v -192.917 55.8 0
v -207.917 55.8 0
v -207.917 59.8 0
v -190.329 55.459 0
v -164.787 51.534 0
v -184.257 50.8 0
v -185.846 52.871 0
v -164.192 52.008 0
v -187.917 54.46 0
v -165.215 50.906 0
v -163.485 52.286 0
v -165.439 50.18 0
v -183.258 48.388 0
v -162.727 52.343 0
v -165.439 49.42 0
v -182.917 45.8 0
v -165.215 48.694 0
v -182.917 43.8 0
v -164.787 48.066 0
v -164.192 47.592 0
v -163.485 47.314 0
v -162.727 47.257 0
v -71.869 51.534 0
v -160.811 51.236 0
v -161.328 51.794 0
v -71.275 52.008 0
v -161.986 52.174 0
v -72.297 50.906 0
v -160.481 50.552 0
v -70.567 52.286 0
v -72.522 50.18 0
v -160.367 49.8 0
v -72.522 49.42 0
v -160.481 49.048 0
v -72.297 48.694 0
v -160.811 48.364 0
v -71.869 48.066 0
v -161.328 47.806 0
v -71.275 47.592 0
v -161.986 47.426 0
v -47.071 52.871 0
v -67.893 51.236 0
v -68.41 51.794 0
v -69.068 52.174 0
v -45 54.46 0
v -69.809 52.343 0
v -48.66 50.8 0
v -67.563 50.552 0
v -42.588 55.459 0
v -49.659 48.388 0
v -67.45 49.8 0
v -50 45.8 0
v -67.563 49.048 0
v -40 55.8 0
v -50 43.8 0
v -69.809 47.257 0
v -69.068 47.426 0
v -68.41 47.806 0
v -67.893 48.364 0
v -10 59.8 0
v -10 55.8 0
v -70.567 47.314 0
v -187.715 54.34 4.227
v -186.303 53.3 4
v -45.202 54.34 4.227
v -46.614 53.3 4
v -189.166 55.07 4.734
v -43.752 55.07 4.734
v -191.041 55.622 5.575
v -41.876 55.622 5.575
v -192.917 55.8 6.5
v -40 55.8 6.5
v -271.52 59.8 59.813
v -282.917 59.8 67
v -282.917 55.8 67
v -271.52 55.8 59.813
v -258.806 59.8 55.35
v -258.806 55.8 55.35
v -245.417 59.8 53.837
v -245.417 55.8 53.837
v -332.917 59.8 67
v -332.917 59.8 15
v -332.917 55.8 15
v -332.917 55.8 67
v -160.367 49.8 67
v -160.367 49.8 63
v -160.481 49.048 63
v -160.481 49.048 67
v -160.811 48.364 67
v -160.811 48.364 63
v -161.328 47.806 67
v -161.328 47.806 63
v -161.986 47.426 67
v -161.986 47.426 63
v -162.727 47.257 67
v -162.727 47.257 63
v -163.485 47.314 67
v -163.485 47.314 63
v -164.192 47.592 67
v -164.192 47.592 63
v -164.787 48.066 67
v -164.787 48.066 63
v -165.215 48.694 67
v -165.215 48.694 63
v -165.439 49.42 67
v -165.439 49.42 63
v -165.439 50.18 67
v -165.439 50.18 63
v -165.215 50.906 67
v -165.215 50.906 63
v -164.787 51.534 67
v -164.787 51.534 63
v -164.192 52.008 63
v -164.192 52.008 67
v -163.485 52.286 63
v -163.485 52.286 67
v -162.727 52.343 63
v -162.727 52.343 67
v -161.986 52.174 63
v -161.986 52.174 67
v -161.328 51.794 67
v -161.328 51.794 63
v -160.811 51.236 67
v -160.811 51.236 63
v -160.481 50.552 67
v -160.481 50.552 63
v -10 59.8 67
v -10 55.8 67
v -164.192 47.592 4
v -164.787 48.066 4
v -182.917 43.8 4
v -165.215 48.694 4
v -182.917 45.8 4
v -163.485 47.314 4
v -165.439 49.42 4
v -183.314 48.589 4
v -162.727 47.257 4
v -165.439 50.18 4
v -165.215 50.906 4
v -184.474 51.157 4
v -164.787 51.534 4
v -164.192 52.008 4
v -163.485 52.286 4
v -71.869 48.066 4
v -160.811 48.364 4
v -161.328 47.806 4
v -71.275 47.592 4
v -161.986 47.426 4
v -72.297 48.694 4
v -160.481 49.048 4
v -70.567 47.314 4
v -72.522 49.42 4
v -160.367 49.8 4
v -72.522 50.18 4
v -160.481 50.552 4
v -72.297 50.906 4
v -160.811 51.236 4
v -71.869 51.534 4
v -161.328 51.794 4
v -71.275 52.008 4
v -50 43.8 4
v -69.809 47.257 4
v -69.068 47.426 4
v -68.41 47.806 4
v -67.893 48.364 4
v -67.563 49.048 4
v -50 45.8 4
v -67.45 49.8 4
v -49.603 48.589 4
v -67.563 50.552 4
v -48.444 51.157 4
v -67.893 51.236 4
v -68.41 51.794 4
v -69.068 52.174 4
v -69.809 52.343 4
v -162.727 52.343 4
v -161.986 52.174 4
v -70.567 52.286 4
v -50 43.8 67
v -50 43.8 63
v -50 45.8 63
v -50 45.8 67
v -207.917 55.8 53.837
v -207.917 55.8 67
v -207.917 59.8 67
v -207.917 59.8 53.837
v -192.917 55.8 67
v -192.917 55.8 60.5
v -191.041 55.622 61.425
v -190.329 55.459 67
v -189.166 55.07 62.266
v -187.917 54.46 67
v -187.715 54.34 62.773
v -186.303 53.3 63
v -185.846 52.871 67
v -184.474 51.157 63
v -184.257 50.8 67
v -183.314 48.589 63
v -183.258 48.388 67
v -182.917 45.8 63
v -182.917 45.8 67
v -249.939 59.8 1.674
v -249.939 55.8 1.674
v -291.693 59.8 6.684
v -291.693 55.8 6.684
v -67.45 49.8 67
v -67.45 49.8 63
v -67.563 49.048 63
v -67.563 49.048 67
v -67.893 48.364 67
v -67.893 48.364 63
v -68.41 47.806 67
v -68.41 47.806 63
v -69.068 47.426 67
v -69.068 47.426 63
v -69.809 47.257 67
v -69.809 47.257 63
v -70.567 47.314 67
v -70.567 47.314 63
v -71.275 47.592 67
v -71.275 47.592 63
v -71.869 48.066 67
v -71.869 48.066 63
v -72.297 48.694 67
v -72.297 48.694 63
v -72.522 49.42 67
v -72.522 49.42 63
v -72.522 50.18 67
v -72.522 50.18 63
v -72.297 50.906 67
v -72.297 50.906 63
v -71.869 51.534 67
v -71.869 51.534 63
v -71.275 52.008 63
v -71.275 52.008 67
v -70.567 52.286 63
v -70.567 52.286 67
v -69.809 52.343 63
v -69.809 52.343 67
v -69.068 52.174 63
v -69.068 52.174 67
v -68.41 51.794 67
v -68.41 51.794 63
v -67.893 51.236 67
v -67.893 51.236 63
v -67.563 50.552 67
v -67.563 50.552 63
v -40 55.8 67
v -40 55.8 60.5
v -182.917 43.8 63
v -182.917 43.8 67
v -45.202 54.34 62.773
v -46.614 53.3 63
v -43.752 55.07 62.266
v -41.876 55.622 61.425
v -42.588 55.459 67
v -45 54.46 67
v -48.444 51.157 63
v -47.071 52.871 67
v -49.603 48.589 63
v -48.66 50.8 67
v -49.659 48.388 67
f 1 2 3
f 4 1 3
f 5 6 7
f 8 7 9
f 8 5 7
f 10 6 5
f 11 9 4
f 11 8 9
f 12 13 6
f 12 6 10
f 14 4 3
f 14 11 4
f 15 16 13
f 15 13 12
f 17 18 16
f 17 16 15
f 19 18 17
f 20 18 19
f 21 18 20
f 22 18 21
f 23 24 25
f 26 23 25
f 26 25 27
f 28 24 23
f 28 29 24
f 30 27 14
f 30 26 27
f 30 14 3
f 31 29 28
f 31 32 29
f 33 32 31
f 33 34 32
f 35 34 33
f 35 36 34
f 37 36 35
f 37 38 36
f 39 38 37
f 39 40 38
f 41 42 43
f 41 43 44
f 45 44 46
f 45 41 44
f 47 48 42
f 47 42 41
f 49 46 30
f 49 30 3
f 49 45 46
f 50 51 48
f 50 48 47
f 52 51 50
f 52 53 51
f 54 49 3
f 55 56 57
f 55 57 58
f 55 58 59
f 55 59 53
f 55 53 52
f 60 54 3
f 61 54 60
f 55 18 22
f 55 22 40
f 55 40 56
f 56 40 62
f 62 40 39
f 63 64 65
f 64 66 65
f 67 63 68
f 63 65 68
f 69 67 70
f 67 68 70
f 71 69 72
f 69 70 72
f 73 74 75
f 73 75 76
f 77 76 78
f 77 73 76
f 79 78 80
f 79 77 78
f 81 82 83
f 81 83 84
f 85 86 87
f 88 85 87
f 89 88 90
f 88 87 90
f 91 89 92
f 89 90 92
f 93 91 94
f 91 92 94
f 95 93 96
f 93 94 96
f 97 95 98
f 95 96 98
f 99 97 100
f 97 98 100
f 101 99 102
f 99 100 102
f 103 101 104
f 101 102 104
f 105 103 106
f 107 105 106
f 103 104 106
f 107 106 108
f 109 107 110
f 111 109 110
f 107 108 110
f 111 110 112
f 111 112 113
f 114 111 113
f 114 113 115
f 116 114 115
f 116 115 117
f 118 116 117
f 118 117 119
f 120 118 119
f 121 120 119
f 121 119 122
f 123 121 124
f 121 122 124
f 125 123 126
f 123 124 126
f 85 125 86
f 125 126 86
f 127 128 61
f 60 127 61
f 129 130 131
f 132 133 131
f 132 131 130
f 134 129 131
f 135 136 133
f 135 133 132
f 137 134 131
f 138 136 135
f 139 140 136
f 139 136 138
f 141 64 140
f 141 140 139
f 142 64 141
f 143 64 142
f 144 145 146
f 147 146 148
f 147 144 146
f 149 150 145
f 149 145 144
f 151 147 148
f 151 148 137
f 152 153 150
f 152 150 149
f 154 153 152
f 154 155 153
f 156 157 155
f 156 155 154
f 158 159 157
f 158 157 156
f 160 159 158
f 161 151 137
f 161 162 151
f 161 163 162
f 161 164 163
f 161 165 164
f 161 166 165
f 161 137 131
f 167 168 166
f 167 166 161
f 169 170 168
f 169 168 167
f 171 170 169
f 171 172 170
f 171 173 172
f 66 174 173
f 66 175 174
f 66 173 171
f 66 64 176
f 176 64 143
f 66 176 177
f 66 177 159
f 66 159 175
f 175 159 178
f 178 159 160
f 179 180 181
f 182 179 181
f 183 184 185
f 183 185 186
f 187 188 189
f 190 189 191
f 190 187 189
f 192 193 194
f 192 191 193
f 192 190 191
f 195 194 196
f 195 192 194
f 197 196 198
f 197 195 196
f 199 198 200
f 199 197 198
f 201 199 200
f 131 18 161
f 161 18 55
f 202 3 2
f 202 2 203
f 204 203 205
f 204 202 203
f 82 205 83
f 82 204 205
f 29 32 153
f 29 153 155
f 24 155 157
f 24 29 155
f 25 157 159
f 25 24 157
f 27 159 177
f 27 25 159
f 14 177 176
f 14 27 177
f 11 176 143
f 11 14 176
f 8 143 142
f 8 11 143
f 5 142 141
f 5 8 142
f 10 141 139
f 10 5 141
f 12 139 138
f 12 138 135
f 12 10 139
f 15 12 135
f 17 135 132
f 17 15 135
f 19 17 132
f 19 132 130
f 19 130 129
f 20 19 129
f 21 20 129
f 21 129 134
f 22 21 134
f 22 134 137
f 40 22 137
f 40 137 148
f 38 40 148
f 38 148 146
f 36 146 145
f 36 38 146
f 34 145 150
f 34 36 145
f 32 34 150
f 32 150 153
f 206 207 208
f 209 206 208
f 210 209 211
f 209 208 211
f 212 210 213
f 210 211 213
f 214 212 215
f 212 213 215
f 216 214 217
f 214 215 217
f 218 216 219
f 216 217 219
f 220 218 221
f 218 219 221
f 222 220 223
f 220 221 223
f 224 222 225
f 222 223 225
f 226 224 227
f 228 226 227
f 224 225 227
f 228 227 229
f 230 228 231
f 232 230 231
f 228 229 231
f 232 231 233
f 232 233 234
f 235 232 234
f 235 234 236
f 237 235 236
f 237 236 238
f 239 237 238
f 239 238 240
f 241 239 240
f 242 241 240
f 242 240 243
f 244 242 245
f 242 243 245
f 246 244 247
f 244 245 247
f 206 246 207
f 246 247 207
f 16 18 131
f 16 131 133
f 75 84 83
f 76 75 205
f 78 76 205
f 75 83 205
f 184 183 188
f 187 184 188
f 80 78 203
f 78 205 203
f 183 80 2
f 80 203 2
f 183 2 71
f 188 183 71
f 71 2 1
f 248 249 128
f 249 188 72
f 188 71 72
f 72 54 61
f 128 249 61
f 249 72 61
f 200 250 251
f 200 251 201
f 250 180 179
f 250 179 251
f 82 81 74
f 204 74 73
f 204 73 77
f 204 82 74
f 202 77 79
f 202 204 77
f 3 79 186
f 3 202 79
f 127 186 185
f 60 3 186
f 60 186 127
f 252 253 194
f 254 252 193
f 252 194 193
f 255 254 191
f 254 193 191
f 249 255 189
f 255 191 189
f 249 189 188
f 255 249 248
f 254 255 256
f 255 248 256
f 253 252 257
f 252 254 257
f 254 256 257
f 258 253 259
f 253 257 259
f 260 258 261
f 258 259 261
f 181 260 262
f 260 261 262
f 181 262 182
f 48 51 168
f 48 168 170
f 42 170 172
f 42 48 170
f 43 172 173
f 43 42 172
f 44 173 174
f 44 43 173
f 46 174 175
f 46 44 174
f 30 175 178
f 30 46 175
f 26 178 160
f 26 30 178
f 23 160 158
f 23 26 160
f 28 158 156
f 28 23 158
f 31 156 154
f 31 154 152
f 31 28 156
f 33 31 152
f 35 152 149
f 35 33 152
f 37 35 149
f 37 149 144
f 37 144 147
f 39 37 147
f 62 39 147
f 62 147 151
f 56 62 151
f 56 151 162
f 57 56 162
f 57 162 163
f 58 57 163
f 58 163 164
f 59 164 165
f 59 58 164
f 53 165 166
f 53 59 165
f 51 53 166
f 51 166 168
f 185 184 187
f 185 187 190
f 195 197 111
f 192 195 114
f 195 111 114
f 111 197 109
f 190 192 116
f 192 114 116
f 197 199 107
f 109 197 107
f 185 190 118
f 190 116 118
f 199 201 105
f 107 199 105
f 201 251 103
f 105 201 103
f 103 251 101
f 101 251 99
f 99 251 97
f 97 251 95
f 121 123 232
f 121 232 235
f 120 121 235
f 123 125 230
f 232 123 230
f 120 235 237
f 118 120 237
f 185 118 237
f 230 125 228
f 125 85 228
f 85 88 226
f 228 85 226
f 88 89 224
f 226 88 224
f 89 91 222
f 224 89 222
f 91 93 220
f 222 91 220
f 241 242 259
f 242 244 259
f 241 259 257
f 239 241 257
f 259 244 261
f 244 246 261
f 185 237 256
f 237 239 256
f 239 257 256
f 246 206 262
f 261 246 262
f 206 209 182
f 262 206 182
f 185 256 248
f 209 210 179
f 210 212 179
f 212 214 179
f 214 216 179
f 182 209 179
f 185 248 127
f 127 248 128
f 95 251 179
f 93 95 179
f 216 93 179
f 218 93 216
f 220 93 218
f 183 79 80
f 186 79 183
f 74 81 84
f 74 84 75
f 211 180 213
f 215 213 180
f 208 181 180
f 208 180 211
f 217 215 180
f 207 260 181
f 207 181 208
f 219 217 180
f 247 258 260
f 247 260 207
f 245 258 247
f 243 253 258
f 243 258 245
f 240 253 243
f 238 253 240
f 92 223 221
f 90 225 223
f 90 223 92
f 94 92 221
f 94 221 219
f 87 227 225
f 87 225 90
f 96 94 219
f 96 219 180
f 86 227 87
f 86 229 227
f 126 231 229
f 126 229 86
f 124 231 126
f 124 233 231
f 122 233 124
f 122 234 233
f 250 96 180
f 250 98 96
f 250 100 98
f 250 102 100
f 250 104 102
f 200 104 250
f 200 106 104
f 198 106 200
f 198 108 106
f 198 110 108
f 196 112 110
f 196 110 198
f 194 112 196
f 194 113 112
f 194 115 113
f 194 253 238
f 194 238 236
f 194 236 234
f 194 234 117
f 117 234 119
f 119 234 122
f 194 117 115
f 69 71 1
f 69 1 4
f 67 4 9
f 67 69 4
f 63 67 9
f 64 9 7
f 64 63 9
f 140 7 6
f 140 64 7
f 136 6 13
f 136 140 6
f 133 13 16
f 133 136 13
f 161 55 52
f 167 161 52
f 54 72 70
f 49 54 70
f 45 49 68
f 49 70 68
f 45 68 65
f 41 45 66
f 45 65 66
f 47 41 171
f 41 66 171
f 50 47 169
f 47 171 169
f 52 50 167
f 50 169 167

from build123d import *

# Parameters (mm, degrees)
SKETCH1_W           = 132.917449813
SKETCH1_H           = 12
SKETCH1_R           = 2.55
BOSS_EXTRUDE1_DEPTH = 4
SKETCH2_W           = 197.917449813
SKETCH2_H           = 67
BOSS_EXTRUDE2_DEPTH = 4
BOSS_EXTRUDE3_START = 4
SKETCH3_W           = 132.917449813
SKETCH3_H           = 12
SKETCH3_R           = 2.55
BOSS_EXTRUDE3_DEPTH = 4
FILLET1_R           = 10
FILLET2_R           = 2.5
BOSS_EXTRUDE4_DEPTH = 4


with BuildPart() as part:
    # Sketch1 → Boss-Extrude1 (new body)
    with BuildSketch(Plane.XY):
        with Locations((-116.458724907, 49.8)):
            Rectangle(SKETCH1_W, SKETCH1_H)
        with Locations((-162.917449813, 49.8)):
            Circle(SKETCH1_R, mode=Mode.SUBTRACT)
        with Locations((-70, 49.8)):
            Circle(SKETCH1_R, mode=Mode.SUBTRACT)
    extrude(amount=BOSS_EXTRUDE1_DEPTH)

    # Sketch2 → Boss-Extrude2 (add)
    with BuildSketch(Plane(origin=(0, 55.8, 0), x_dir=(1, 0, 0), z_dir=(0, 1, 0))):
        with Locations((-108.958724907, -33.5)):
            Rectangle(SKETCH2_W, SKETCH2_H)
    extrude(amount=BOSS_EXTRUDE2_DEPTH)

    # Sketch3 → Boss-Extrude3 (add)
    with BuildSketch(Plane(origin=(0, 0, 67), x_dir=(-1, 0, 0), z_dir=(0, 0, -1)).offset(BOSS_EXTRUDE3_START)):
        with Locations((116.458724907, 49.8)):
            Rectangle(SKETCH3_W, SKETCH3_H)
        with Locations(Location((162.917449813, 49.8, 0), (0, 0, 180))):
            Circle(SKETCH3_R, mode=Mode.SUBTRACT)
        with Locations(Location((70, 49.8, 0), (0, 0, 180))):
            Circle(SKETCH3_R, mode=Mode.SUBTRACT)
    extrude(amount=-BOSS_EXTRUDE3_DEPTH)

    # Fillet1
    fillet1_edges = [part.edges().sort_by_distance(p)[0] for p in [
        (-182.917449813, 55.8, 65),
        (-50, 55.8, 65),
        (-182.917449813, 55.8, 2),
        (-50, 55.8, 2),
    ]]
    fillet(fillet1_edges, radius=FILLET1_R)

    # Fillet2
    fillet2_edges = [part.edges().sort_by_distance(p)[0] for p in [
        (-116.458724906, 55.8, 4),
        (-116.458724906, 55.8, 63),
    ]]
    fillet(fillet2_edges, radius=FILLET2_R)

    # Sketch4 → Boss-Extrude4 (add)
    with BuildSketch(Plane(origin=(0, 59.8, 0), x_dir=(1, 0, 0), z_dir=(0, 1, 0))):
        with BuildLine():
            Line((-207.917449813, -53.837484988), (-207.917449813, 0))
            ThreePointArc((-207.917449813, 0), (-270.865841373, -3.763403666), (-332.917449813, -15))
            Line((-332.917449813, -15), (-332.917449813, -67))
            Line((-332.917449813, -67), (-282.917449813, -67))
            ThreePointArc((-282.917449813, -67), (-265.288923094, -57.223665565), (-245.417449813, -53.837484988))
            Line((-245.417449813, -53.837484988), (-207.917449813, -53.837484988))
        make_face()
    extrude(amount=-BOSS_EXTRUDE4_DEPTH)


solid = part.part
